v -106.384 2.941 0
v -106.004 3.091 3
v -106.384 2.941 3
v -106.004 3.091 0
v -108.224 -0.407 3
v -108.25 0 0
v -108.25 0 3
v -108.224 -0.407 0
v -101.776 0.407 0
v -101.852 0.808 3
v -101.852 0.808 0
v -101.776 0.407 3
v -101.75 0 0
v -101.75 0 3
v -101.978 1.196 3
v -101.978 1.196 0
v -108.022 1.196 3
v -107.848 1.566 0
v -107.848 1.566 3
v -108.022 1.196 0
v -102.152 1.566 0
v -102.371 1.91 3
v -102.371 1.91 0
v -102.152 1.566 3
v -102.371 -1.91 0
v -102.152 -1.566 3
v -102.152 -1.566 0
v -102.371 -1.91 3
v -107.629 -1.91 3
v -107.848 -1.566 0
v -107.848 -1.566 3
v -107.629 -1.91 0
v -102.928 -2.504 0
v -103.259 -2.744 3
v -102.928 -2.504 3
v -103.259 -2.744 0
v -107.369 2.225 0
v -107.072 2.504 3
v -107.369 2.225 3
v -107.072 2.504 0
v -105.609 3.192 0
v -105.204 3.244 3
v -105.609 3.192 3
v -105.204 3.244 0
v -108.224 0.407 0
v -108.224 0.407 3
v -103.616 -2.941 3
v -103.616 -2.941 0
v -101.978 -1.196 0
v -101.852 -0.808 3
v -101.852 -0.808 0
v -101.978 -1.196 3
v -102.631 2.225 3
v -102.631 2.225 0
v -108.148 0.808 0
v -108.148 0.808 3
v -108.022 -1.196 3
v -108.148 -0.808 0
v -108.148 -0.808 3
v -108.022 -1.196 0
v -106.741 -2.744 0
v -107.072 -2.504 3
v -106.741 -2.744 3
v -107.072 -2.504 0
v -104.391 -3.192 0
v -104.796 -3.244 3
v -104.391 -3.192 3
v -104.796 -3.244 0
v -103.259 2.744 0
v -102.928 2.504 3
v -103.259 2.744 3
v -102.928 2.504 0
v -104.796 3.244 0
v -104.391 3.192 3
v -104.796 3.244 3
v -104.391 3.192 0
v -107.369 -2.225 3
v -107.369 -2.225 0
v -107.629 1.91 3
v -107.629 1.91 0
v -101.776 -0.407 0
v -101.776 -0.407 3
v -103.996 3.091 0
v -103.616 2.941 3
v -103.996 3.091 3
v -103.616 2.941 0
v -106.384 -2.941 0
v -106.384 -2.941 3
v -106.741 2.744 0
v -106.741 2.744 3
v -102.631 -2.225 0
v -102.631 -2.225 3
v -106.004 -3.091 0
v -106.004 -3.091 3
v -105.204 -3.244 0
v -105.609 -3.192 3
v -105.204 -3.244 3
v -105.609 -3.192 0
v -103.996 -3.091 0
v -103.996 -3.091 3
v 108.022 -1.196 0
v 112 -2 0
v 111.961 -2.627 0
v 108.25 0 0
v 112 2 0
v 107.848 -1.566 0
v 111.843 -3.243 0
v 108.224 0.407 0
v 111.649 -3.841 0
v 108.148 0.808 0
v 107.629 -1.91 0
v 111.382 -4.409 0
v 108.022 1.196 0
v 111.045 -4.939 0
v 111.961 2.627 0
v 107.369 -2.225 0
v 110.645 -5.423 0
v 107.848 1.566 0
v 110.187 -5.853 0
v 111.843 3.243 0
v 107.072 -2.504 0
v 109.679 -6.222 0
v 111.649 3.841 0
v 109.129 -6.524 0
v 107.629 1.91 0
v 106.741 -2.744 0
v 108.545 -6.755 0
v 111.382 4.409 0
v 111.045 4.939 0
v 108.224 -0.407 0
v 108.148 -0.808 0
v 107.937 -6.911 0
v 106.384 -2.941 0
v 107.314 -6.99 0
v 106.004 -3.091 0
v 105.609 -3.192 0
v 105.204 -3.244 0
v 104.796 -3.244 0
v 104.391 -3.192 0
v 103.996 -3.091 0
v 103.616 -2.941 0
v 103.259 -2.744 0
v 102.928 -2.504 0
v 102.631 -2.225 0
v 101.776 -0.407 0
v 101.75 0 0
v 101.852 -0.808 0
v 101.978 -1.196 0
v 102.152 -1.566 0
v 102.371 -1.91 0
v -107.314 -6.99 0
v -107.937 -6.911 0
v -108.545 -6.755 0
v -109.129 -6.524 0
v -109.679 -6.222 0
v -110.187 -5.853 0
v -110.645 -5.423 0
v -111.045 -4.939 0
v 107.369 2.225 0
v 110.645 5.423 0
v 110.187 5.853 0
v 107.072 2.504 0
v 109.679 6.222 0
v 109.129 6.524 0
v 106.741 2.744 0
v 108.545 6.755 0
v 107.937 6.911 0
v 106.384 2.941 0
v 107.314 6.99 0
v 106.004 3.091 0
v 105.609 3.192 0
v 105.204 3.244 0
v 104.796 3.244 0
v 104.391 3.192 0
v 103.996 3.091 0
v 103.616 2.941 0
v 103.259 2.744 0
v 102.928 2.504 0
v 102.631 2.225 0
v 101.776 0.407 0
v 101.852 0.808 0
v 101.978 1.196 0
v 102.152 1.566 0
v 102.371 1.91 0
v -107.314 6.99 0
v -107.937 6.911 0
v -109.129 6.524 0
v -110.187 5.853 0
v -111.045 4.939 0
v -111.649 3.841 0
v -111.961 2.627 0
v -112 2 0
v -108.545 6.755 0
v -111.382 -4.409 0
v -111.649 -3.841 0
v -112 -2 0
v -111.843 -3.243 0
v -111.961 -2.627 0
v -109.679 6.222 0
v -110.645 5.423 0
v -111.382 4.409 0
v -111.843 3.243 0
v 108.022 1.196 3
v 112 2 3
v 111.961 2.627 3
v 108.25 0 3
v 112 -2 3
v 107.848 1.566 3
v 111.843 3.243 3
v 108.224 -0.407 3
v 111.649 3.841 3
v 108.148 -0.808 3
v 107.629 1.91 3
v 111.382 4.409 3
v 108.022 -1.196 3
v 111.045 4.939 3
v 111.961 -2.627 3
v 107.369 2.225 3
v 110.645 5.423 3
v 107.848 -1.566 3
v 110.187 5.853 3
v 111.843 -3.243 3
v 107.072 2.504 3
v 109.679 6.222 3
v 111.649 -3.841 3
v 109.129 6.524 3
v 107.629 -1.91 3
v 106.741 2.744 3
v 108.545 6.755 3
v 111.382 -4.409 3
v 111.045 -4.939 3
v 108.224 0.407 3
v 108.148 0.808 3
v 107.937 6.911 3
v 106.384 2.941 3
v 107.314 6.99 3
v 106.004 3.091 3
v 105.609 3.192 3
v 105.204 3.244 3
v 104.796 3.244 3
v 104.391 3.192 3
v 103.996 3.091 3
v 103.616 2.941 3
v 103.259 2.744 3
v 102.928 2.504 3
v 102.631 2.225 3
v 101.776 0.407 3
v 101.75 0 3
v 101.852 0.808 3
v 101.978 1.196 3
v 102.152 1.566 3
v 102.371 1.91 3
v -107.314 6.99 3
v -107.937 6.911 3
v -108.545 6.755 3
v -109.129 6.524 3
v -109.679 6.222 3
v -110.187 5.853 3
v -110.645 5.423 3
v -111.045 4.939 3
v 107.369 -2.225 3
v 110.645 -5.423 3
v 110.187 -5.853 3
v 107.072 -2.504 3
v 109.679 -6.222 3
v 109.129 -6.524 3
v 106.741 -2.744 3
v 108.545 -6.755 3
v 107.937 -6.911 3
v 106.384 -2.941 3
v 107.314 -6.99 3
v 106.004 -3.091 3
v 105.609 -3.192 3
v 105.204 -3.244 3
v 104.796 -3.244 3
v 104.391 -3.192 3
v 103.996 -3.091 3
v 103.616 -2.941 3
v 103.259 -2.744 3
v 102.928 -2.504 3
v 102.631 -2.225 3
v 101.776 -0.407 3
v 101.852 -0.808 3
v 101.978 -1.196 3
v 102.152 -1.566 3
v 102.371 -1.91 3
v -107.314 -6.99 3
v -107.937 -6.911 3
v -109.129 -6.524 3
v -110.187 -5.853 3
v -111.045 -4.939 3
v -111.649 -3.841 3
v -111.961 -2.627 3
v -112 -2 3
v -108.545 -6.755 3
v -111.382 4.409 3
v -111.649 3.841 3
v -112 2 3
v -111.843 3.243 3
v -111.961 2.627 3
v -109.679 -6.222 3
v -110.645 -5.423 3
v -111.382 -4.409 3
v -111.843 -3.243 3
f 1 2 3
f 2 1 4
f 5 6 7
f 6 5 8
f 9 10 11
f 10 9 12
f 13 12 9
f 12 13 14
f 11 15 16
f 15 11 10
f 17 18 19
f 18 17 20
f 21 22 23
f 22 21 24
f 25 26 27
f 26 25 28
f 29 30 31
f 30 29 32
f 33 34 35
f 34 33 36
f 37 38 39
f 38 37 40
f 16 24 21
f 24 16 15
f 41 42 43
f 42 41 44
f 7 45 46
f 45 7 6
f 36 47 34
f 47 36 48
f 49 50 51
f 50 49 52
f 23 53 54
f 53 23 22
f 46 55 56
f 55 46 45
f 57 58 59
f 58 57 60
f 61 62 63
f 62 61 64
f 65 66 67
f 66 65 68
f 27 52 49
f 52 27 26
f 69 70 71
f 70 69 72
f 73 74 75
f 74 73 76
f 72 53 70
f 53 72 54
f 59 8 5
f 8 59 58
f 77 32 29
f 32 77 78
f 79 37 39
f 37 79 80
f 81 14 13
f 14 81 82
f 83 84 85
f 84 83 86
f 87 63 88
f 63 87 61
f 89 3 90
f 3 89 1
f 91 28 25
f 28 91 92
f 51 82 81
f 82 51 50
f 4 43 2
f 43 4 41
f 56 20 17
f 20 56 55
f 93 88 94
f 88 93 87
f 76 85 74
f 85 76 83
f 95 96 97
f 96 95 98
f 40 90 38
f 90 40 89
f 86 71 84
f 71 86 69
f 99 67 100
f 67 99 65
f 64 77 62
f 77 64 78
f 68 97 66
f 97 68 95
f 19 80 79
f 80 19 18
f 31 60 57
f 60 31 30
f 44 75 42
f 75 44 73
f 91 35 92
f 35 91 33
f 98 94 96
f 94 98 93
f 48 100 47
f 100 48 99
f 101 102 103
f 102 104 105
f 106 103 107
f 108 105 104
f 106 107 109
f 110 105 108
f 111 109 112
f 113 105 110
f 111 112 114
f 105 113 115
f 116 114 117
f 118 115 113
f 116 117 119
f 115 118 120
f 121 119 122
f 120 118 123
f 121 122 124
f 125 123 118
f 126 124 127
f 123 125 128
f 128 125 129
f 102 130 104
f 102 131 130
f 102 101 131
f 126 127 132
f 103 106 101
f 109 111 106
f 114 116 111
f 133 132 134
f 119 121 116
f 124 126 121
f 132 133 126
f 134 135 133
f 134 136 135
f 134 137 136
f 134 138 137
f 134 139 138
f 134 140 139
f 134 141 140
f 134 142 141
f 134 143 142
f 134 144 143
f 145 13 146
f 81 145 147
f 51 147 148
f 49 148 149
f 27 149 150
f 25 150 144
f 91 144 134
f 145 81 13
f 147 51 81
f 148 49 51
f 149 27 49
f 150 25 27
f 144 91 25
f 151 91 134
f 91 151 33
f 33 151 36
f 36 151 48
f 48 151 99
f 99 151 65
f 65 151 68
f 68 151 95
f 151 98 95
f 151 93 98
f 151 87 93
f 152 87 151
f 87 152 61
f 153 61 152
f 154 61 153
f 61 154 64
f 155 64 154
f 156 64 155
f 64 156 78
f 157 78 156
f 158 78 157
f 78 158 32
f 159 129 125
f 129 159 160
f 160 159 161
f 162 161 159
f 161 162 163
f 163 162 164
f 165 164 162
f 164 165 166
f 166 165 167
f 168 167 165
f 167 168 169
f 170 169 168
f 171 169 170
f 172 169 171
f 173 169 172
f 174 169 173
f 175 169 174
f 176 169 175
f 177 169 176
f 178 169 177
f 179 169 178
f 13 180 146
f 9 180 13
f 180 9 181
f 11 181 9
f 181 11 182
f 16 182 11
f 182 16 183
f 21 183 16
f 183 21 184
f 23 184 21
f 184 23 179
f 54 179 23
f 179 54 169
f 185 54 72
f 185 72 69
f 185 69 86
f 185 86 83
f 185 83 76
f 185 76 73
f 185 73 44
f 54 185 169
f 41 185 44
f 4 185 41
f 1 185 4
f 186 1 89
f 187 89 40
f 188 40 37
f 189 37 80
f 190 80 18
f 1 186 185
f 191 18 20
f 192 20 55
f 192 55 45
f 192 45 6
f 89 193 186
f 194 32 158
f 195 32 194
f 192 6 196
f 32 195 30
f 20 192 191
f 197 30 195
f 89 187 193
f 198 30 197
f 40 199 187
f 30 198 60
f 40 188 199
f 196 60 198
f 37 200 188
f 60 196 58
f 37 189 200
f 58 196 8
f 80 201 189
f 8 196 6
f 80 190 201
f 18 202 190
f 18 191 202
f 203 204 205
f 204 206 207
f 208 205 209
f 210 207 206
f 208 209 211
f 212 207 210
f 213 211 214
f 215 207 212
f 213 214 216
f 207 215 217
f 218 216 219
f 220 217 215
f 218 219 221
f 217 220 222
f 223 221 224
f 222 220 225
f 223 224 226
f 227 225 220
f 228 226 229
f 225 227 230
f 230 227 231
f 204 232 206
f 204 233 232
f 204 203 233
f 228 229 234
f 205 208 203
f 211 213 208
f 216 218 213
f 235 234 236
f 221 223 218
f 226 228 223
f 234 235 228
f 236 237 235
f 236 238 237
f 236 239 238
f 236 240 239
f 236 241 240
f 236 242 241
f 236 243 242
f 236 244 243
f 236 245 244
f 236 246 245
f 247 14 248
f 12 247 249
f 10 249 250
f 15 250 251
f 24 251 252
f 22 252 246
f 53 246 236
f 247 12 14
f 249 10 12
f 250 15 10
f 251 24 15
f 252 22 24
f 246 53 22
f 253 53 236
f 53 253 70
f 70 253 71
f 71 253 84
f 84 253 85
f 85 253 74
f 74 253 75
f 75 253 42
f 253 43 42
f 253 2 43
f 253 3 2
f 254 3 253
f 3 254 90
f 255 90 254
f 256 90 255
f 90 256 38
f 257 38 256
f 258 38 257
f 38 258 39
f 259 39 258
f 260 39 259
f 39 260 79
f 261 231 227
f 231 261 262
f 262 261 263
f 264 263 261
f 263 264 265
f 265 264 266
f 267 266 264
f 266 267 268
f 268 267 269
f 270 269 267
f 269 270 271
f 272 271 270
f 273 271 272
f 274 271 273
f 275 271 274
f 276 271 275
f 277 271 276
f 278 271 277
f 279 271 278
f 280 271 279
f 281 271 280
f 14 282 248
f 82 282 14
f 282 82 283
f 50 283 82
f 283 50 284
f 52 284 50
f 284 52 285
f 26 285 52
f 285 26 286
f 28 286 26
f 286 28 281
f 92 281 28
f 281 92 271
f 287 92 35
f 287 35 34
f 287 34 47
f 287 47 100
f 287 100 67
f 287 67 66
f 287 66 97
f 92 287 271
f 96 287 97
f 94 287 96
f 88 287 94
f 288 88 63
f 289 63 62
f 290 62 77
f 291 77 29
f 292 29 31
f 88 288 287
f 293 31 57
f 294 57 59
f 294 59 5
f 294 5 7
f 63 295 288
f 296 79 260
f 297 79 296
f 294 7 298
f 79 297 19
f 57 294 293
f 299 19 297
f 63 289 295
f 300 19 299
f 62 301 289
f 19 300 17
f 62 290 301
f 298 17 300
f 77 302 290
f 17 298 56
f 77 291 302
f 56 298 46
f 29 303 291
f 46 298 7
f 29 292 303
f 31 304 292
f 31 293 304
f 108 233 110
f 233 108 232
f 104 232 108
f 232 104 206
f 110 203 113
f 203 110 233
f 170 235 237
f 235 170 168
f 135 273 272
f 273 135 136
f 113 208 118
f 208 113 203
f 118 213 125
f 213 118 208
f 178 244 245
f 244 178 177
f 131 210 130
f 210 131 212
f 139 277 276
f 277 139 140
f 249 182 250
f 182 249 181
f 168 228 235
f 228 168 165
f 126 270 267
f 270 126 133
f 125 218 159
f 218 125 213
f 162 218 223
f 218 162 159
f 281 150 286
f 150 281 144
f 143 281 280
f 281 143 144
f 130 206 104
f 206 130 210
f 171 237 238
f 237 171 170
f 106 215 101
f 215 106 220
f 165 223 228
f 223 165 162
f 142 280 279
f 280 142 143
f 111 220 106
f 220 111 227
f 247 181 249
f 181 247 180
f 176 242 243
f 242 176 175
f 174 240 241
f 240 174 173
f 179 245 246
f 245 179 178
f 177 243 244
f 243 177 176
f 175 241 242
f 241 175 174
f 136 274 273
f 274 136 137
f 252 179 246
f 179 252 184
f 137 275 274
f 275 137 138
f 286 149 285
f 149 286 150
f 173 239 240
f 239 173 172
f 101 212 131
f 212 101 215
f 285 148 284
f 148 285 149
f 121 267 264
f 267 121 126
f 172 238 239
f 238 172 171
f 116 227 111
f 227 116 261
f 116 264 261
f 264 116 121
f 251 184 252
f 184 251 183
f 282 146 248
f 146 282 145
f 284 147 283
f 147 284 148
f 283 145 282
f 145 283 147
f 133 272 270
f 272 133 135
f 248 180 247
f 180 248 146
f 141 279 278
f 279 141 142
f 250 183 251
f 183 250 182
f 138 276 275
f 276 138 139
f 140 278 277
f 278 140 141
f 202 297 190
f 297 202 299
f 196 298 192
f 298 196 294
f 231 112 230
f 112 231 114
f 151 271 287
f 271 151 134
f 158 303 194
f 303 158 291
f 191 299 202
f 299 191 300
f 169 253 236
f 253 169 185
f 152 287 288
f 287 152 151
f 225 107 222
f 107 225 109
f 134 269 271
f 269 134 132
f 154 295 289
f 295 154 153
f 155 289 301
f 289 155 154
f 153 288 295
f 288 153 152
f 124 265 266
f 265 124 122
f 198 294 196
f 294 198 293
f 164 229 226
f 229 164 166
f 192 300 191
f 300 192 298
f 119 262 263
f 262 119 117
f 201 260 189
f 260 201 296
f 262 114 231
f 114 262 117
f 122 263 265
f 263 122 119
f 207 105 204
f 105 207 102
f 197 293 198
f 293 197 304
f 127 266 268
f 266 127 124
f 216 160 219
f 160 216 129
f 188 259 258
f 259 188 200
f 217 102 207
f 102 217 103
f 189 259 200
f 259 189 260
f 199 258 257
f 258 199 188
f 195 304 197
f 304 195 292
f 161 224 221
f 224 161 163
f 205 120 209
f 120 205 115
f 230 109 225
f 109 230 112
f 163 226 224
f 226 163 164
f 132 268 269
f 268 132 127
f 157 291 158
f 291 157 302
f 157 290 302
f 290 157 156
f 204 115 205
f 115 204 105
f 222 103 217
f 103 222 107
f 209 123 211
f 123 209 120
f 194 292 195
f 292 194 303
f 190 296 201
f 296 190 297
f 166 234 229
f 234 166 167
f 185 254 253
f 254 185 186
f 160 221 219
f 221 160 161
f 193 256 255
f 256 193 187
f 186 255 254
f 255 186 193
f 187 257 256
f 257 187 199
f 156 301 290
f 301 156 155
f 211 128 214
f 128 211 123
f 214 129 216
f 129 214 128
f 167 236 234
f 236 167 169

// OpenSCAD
$fn = 50;


difference() {
	union() {
		hull() {
			translate(v = [-107.0000000000, 2.0000000000, 0]) {
				cylinder(h = 3, r = 5);
			}
			translate(v = [107.0000000000, 2.0000000000, 0]) {
				cylinder(h = 3, r = 5);
			}
			translate(v = [-107.0000000000, -2.0000000000, 0]) {
				cylinder(h = 3, r = 5);
			}
			translate(v = [107.0000000000, -2.0000000000, 0]) {
				cylinder(h = 3, r = 5);
			}
		}
	}
	union() {
		translate(v = [-105.0000000000, 0.0000000000, 0]) {
			cylinder(h = 3, r = 3.2500000000);
		}
		translate(v = [105.0000000000, 0.0000000000, 0]) {
			cylinder(h = 3, r = 3.2500000000);
		}
		translate(v = [-105.0000000000, 0.0000000000, 0]) {
			cylinder(h = 3, r = 1.8000000000);
		}
		translate(v = [105.0000000000, 0.0000000000, 0]) {
			cylinder(h = 3, r = 1.8000000000);
		}
		translate(v = [-105.0000000000, 0.0000000000, 0]) {
			cylinder(h = 3, r = 1.8000000000);
		}
		translate(v = [105.0000000000, 0.0000000000, 0]) {
			cylinder(h = 3, r = 1.8000000000);
		}
		translate(v = [-105.0000000000, 0.0000000000, 0]) {
			cylinder(h = 3, r = 1.8000000000);
		}
		translate(v = [105.0000000000, 0.0000000000, 0]) {
			cylinder(h = 3, r = 1.8000000000);
		}
	}
}
